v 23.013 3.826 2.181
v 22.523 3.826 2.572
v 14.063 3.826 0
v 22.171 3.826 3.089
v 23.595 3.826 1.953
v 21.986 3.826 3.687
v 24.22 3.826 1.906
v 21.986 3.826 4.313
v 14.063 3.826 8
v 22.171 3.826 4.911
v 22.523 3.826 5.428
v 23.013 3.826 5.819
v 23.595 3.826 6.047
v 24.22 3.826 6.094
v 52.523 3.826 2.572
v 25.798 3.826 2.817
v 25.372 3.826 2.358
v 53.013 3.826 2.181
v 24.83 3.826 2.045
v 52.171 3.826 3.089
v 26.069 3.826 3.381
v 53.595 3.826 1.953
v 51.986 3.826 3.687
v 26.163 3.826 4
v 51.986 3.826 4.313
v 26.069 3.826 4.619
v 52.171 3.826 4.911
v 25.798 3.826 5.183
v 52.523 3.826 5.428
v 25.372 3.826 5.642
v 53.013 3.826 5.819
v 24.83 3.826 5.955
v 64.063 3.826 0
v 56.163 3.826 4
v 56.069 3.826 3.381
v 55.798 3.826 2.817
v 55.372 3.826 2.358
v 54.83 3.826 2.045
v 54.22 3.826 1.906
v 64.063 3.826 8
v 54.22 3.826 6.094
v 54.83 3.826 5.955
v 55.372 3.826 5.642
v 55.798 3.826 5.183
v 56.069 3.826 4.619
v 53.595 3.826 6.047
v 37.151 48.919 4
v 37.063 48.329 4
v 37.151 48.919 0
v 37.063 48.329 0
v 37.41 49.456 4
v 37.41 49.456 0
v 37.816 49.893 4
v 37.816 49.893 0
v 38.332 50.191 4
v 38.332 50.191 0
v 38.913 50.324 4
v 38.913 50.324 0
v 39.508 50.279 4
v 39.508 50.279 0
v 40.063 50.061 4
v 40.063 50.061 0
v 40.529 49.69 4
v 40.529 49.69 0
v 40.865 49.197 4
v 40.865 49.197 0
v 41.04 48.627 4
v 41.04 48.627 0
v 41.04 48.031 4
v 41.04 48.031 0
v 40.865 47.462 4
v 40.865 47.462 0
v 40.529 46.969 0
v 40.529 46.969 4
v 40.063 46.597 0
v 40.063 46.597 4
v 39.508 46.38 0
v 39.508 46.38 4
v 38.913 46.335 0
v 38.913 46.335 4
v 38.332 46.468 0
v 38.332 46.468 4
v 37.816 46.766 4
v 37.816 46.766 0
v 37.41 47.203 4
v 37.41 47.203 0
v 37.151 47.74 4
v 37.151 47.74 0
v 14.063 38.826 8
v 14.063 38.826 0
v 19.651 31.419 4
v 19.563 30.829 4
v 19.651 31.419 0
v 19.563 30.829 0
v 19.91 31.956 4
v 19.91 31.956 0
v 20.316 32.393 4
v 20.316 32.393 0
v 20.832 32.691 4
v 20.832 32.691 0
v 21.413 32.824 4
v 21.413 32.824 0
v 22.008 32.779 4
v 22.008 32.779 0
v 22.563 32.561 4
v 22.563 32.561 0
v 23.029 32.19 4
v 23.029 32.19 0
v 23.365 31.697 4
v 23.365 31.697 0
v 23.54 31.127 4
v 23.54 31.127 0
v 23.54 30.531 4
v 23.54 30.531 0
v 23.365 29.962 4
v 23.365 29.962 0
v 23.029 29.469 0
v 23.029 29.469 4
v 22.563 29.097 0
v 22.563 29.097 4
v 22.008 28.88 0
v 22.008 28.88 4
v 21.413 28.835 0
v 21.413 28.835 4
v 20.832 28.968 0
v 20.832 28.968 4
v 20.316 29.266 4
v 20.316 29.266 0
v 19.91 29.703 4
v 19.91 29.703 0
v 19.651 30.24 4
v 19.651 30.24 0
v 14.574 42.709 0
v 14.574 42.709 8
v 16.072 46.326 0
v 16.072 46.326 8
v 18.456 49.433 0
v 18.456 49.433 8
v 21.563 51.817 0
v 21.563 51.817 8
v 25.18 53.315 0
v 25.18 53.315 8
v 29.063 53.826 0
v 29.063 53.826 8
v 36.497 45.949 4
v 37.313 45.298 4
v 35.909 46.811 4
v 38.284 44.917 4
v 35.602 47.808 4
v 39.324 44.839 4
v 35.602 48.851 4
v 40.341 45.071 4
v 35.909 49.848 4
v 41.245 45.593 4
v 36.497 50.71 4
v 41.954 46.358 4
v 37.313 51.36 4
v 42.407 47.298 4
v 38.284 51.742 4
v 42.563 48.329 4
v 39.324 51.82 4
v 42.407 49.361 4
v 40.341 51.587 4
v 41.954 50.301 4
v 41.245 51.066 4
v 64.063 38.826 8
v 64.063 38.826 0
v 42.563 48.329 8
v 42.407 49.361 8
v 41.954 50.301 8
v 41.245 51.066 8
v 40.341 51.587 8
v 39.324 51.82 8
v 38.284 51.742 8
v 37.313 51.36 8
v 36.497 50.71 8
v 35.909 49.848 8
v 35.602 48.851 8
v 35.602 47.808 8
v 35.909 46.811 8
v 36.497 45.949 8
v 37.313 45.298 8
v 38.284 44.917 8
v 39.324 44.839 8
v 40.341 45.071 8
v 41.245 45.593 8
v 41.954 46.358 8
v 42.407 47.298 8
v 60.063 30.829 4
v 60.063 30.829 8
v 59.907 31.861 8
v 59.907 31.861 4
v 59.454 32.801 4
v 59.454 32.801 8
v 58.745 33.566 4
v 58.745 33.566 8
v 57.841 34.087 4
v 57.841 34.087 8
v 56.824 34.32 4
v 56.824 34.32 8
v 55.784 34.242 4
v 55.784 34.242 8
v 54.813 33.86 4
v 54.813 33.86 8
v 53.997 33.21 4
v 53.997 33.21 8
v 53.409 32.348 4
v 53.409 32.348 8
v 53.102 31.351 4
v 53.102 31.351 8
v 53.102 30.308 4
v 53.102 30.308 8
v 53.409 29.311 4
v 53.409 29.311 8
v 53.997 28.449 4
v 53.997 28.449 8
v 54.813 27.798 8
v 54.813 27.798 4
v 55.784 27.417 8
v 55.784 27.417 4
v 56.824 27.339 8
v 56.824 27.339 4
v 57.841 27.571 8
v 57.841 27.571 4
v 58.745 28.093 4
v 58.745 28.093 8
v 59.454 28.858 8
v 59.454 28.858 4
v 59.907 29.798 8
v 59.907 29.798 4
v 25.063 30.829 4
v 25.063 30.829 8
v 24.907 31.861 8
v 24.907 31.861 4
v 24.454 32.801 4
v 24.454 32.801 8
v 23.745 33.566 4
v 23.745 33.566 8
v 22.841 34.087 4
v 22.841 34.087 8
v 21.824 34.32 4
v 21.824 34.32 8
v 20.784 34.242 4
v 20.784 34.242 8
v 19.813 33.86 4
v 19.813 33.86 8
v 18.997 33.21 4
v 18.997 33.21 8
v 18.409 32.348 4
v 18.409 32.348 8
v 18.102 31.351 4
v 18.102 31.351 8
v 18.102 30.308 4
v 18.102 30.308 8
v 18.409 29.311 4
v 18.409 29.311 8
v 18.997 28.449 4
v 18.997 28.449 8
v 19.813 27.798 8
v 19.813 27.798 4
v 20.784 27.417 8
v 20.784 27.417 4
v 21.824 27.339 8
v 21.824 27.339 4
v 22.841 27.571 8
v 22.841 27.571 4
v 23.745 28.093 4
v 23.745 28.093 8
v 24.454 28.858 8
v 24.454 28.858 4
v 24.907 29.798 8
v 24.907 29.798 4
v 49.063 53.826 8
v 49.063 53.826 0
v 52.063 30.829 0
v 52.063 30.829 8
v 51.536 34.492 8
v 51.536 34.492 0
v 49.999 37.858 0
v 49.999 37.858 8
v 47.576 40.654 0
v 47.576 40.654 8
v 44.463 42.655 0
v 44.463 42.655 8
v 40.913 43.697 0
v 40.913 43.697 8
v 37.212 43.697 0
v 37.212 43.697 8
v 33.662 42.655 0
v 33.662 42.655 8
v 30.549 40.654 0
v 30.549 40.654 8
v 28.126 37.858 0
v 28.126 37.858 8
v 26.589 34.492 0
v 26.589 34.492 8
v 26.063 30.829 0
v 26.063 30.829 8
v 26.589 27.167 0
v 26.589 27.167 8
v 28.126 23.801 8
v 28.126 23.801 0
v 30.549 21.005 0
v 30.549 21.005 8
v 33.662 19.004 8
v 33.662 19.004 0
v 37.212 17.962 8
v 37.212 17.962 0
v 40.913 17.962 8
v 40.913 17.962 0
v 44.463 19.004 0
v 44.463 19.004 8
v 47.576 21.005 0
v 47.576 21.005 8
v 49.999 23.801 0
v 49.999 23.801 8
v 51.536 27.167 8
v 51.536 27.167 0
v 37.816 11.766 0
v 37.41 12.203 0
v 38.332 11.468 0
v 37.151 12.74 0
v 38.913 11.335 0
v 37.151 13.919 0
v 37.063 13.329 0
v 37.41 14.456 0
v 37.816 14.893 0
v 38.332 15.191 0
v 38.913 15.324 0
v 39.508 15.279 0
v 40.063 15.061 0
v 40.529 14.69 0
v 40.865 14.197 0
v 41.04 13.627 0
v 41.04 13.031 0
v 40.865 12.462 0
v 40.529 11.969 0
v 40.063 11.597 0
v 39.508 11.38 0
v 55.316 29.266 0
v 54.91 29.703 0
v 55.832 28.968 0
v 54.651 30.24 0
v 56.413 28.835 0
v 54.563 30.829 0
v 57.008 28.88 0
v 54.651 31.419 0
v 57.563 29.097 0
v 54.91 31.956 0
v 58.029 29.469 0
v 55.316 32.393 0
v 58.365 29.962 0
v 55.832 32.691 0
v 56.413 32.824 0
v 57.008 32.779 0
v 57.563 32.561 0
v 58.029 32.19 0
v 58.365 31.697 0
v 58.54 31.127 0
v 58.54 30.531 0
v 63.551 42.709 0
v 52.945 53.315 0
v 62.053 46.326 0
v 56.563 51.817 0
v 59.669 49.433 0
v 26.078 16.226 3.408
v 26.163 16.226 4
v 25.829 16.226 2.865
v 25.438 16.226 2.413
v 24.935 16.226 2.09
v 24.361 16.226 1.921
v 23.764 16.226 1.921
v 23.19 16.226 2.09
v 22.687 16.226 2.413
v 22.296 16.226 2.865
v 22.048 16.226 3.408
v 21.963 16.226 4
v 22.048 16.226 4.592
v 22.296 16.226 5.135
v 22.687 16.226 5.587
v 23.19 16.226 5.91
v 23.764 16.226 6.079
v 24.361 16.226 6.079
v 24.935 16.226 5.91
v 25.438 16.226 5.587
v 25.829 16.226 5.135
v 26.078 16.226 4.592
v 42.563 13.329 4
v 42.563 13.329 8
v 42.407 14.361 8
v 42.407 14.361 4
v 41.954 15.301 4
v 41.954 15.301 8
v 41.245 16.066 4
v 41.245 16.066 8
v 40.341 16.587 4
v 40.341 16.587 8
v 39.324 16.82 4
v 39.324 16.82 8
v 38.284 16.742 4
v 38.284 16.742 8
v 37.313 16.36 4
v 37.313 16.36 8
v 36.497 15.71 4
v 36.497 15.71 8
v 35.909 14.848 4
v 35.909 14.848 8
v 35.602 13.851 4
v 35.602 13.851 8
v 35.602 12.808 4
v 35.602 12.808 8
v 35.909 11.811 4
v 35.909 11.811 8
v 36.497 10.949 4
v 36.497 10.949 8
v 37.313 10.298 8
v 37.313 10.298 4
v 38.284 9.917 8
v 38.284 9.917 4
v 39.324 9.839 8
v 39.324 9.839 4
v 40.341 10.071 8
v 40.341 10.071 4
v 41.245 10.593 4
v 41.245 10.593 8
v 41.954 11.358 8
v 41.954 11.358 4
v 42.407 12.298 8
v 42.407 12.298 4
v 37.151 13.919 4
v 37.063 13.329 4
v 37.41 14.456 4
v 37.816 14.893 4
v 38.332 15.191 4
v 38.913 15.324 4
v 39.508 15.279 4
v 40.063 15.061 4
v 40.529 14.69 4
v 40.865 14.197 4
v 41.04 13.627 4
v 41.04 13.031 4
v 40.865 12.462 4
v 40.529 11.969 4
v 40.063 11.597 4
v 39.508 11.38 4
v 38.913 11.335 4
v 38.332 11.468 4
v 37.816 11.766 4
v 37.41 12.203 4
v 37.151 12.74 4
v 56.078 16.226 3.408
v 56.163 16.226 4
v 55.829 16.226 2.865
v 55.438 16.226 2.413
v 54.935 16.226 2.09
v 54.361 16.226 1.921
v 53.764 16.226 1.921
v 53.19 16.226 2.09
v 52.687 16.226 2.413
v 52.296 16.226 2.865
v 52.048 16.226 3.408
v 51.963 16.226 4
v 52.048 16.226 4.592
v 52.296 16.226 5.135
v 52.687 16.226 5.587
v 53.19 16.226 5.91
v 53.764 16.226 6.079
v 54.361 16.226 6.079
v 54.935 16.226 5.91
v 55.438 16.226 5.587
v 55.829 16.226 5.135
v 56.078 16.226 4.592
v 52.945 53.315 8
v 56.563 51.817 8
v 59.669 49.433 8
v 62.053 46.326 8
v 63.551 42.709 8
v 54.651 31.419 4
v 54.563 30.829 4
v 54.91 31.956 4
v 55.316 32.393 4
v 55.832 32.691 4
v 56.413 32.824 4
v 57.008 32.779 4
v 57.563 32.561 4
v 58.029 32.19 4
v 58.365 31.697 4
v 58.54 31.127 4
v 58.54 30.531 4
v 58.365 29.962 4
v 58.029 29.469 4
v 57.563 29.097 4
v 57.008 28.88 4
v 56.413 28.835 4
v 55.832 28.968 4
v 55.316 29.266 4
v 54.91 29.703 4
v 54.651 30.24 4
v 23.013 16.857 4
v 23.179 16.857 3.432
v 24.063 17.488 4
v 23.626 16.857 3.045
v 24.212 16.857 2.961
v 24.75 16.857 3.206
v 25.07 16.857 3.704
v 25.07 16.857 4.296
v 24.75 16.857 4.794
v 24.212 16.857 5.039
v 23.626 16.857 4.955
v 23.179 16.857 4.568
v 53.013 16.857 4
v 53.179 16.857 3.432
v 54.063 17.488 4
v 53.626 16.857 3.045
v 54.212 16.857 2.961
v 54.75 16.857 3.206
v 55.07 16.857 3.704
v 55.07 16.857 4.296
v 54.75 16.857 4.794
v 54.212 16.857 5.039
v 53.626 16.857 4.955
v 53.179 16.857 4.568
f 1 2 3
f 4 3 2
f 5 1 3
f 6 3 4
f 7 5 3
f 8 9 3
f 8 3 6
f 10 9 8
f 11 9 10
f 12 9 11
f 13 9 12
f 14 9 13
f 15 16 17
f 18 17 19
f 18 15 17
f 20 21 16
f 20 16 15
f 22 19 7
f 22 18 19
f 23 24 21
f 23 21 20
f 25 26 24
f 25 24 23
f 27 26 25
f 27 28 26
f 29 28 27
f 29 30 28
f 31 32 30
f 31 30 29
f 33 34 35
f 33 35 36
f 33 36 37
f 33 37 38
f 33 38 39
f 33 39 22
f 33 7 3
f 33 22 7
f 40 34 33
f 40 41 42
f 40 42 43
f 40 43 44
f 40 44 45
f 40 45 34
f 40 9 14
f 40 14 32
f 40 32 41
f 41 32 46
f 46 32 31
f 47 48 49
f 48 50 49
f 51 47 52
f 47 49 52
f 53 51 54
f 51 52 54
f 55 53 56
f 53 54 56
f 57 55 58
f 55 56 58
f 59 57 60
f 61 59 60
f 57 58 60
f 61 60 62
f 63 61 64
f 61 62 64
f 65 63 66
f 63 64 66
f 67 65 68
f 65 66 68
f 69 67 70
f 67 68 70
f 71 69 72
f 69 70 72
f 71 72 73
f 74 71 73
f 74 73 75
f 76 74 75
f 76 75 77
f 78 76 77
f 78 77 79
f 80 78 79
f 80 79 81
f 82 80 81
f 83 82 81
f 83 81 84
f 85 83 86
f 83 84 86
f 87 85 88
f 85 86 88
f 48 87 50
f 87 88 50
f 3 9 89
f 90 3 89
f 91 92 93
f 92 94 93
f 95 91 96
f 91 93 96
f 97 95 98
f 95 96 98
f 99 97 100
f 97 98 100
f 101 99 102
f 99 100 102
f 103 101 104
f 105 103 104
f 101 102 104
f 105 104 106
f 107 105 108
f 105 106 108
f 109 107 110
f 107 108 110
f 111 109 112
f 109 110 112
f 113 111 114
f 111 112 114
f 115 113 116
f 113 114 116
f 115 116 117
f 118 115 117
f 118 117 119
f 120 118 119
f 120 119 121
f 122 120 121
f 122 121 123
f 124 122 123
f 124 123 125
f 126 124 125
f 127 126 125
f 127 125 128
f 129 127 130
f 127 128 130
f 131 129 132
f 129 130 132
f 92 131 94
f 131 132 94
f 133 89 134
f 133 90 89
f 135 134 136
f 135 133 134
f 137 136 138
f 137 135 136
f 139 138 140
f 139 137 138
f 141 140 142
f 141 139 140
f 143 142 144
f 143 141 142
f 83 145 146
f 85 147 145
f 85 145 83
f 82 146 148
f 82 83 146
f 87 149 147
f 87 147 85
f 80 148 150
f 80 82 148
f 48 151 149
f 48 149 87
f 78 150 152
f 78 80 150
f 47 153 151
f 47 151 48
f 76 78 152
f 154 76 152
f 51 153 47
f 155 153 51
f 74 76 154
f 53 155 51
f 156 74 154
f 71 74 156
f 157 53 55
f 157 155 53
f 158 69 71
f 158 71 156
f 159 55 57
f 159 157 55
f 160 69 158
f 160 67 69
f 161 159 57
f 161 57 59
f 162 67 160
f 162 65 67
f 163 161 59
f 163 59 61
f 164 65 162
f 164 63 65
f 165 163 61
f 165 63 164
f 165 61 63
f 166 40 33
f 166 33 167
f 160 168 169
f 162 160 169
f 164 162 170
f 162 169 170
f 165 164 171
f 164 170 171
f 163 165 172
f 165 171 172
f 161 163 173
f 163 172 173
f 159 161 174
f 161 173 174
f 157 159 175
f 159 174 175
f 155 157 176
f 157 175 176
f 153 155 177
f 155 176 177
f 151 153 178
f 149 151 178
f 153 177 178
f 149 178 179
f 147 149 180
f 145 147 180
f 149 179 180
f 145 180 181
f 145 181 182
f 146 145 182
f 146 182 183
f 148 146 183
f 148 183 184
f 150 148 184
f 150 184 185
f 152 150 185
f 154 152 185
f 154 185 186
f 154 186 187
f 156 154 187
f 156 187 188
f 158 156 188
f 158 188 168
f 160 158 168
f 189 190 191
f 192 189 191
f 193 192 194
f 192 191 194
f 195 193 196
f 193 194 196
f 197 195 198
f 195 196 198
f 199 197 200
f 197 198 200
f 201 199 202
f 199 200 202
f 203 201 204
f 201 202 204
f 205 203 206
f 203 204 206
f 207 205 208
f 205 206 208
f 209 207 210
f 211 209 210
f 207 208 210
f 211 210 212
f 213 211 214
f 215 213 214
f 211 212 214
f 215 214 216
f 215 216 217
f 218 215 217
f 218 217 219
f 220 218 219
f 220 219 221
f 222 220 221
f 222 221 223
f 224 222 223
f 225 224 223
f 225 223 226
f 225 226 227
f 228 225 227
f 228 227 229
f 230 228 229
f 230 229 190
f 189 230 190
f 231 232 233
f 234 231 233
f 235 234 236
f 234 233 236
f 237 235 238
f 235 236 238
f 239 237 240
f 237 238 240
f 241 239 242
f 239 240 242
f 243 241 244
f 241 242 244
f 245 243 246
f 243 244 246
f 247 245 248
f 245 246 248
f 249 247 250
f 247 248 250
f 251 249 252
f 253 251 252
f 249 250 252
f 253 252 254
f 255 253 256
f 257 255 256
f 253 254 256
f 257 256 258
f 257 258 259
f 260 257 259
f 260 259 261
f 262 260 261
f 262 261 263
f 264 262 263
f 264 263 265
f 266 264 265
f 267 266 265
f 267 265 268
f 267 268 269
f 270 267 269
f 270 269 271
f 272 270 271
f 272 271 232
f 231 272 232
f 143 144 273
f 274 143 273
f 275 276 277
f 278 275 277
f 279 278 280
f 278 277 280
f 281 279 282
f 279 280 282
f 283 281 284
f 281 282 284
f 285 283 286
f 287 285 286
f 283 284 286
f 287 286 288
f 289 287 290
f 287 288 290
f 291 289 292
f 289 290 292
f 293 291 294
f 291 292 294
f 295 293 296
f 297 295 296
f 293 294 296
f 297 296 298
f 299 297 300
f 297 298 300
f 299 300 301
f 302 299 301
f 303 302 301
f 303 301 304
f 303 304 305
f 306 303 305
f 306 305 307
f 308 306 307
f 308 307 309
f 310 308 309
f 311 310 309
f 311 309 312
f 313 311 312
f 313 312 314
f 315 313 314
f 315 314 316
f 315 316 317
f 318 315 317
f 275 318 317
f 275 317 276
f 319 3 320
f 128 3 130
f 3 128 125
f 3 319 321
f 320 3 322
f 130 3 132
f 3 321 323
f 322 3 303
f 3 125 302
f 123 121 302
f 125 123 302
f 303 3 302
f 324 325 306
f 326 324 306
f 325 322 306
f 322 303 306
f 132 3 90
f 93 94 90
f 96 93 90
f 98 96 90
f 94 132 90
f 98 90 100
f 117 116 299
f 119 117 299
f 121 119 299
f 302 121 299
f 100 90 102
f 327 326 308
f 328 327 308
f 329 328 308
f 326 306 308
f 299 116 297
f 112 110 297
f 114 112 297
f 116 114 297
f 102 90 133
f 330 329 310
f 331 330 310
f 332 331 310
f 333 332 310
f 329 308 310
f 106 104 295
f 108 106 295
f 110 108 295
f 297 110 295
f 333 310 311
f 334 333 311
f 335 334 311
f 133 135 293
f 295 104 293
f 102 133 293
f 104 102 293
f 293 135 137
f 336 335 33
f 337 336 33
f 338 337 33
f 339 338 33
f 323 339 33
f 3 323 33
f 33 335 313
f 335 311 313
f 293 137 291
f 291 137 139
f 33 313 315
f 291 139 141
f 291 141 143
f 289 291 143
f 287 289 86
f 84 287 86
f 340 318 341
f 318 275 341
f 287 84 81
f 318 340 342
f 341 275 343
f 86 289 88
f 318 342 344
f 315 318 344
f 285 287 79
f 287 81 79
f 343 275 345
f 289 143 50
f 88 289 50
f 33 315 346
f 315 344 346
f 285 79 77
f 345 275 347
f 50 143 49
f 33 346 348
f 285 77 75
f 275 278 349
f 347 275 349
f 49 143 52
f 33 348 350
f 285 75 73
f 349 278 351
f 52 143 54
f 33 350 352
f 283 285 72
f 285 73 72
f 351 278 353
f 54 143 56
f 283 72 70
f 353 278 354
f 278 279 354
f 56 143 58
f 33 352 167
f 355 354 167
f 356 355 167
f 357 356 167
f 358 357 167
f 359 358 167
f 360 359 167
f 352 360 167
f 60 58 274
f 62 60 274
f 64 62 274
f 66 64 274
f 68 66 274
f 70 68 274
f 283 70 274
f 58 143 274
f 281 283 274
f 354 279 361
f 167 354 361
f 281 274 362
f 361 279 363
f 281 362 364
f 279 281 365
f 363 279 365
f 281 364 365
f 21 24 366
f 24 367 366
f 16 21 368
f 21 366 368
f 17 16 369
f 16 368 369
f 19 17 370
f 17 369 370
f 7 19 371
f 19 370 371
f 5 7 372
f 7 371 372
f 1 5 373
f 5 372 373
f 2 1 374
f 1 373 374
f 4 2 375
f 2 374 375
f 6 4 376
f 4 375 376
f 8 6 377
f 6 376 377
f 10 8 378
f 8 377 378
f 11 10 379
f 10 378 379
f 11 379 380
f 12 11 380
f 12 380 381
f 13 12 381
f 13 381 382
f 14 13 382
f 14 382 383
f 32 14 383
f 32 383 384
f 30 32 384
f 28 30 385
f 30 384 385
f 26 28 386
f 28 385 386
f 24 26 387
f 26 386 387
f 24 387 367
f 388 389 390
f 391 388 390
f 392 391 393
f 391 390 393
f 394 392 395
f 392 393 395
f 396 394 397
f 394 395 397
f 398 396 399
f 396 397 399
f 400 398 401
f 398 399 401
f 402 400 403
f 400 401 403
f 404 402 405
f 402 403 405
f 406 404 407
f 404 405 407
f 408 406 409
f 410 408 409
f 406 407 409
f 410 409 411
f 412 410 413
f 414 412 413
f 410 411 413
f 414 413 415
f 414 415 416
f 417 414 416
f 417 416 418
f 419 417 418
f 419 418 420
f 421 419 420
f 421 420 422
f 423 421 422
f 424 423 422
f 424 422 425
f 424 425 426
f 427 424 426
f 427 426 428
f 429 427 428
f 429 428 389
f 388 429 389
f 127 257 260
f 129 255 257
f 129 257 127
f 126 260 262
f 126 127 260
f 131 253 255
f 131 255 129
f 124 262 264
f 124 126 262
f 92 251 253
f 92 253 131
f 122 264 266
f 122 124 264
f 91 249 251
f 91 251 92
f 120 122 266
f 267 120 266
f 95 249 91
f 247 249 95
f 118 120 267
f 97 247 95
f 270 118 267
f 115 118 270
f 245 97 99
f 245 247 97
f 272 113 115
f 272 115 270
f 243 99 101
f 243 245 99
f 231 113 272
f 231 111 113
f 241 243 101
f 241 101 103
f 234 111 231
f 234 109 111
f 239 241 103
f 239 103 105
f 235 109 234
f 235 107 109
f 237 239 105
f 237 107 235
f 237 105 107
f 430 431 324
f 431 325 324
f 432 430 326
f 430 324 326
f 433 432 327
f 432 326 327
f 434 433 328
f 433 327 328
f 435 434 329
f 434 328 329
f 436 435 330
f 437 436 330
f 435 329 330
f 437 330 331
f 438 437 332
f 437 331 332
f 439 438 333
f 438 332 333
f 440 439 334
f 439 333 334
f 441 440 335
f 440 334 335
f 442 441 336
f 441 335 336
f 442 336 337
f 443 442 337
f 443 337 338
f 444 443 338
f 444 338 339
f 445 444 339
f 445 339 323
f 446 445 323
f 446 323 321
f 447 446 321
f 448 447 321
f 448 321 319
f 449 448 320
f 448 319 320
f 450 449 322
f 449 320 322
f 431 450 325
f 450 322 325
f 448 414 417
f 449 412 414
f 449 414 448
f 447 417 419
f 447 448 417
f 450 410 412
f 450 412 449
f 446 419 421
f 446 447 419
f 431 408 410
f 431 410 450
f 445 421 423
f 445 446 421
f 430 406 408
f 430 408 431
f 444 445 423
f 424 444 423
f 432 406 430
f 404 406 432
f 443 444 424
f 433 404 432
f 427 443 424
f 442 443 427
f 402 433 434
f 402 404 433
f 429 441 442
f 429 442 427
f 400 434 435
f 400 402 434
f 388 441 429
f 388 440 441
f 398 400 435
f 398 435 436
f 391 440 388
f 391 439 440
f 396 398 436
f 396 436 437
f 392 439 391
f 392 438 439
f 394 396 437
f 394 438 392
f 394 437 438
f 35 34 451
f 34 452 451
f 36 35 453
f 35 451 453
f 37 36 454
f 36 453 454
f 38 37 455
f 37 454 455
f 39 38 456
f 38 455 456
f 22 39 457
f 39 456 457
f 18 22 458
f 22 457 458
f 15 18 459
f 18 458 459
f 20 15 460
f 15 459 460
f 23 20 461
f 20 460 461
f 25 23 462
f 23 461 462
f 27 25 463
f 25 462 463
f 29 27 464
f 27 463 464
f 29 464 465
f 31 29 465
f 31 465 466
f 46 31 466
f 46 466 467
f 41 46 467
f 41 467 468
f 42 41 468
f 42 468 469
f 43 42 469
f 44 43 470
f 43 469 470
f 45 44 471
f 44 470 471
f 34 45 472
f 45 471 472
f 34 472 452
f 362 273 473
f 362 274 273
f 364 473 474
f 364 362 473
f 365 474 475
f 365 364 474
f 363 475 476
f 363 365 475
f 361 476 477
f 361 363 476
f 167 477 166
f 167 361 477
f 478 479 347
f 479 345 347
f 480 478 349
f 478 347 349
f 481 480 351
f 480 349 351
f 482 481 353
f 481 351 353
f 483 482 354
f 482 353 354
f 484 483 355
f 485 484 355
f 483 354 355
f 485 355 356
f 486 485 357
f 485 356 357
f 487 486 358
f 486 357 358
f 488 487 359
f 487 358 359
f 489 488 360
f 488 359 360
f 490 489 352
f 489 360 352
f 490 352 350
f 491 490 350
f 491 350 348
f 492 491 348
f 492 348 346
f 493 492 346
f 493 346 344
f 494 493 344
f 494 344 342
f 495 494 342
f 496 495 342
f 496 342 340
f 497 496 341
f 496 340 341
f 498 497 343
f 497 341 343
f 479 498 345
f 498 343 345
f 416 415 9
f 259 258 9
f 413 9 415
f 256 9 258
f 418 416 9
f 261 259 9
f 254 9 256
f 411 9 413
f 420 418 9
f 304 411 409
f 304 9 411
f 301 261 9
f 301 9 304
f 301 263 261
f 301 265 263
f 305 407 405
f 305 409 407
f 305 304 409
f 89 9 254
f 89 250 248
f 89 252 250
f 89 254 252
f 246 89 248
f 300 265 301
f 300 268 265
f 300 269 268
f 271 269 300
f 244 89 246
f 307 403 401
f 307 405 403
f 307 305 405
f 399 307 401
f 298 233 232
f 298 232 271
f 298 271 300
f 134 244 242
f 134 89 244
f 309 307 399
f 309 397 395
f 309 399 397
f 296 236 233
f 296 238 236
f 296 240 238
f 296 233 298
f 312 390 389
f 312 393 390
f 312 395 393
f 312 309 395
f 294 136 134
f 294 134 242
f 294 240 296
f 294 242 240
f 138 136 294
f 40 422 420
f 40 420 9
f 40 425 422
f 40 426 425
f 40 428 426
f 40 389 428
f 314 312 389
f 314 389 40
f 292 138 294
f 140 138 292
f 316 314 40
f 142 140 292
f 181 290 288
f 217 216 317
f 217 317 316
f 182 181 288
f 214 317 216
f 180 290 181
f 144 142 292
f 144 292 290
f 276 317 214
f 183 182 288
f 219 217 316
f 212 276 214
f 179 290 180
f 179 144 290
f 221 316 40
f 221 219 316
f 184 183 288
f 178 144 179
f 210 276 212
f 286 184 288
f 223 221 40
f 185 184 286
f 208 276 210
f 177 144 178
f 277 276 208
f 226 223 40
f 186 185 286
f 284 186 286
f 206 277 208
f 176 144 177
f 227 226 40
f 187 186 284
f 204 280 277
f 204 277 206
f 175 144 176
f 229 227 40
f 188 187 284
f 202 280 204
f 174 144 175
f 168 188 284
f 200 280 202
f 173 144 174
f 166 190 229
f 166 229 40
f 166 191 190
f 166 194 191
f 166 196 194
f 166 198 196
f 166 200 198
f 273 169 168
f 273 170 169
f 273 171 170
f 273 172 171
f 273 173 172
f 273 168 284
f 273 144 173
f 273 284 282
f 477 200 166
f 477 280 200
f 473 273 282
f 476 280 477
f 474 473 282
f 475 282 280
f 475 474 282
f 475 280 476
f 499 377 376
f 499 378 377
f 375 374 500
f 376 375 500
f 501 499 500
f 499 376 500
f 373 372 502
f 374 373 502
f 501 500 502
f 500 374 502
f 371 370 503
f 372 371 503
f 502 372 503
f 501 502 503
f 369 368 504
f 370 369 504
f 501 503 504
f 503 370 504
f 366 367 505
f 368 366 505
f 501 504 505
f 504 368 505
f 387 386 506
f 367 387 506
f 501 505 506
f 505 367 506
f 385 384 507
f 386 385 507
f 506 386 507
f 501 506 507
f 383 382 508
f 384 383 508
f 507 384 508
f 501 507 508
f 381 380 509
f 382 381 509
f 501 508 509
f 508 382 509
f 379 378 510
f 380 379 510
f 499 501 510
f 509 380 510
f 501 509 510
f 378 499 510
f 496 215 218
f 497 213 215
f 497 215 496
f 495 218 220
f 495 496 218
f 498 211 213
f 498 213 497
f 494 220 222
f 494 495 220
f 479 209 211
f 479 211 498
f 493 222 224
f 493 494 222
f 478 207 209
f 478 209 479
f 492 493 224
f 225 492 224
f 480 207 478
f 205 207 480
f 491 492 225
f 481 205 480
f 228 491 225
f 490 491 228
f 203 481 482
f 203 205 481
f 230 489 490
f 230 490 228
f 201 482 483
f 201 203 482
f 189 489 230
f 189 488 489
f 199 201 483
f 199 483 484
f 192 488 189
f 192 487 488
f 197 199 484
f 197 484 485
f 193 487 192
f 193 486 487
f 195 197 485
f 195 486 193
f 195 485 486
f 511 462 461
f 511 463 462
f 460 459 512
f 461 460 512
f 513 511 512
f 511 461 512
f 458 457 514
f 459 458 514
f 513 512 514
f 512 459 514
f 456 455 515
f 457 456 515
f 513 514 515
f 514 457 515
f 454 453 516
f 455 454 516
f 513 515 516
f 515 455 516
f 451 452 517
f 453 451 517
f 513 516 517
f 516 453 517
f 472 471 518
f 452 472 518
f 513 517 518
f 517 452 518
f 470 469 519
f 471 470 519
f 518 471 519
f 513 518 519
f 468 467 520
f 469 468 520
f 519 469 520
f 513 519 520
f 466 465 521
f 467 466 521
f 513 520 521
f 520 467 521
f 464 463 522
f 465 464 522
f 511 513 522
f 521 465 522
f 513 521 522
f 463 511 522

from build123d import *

# Parameters (mm, degrees)
SKETCH_1_W                     = 50
SKETCH_1_H                     = 50
EXTRUDE_1_DEPTH                = 8
HOLE_WIZARD_M22_1_D            = 26
HOLE_WIZARD_M3_5_1_D           = 4
HOLE_WIZARD_M3_5_1_CBORE_D     = 7
HOLE_WIZARD_M3_5_1_CBORE_DEPTH = 4
HOLE_WIZARD_4_2_4_2_1_D        = 4.2
HOLE_WIZARD_4_2_4_2_1_DEPTH    = 12.4
HOLE_WIZARD_4_2_4_2_1_TIP      = 1.2618073
FILLET_1_R                     = 15


with BuildPart() as part:
    # 草图1 → 凸台-拉伸1 (new body)
    with BuildSketch(Plane.XY.offset(8)):
        with Locations((39.062572137, 28.826485826)):
            Rectangle(SKETCH_1_W, SKETCH_1_H)
    extrude(amount=-EXTRUDE_1_DEPTH)

    # M22 间隙孔1 (through all)
    with Locations(Plane(origin=(0, 0, 0), x_dir=(-1, 0, 0), z_dir=(0, 0, -1))):
        with Locations((-39.062572137, 30.829359323)):
            Hole(HOLE_WIZARD_M22_1_D / 2)

    # M3.5 六角头机械螺钉的柱形沉头孔1 (through all)
    with Locations(Plane.XY.offset(8)):
        with Locations((39.062572137, 13.329359323), (39.062572137, 48.329359323), (56.562572137, 30.829359323), (21.562572137, 30.829359323)):
            CounterBoreHole(HOLE_WIZARD_M3_5_1_D / 2, HOLE_WIZARD_M3_5_1_CBORE_D / 2, HOLE_WIZARD_M3_5_1_CBORE_DEPTH)

    # Ø4.2 (4.2) 直径孔1
    with Locations(Plane(origin=(0, 3.826485826, 0), x_dir=(-1, 0, 0), z_dir=(0, -1, 0))):
        with Locations((-24.062572137, -4), (-54.062572137, -4)):
            Hole(HOLE_WIZARD_4_2_4_2_1_D / 2, depth=HOLE_WIZARD_4_2_4_2_1_DEPTH)
            with Locations((0, 0, -(HOLE_WIZARD_4_2_4_2_1_DEPTH + HOLE_WIZARD_4_2_4_2_1_TIP / 2))):  # 118° drill point
                Cone(0, HOLE_WIZARD_4_2_4_2_1_D / 2, HOLE_WIZARD_4_2_4_2_1_TIP, mode=Mode.SUBTRACT)

    # 圆角1
    fillet_1_edges = [part.edges().sort_by_distance(p)[0] for p in [
        (64.062572137, 53.826485826, 4),
        (14.062572137, 53.826485826, 4),
    ]]
    fillet(fillet_1_edges, radius=FILLET_1_R)


solid = part.part
